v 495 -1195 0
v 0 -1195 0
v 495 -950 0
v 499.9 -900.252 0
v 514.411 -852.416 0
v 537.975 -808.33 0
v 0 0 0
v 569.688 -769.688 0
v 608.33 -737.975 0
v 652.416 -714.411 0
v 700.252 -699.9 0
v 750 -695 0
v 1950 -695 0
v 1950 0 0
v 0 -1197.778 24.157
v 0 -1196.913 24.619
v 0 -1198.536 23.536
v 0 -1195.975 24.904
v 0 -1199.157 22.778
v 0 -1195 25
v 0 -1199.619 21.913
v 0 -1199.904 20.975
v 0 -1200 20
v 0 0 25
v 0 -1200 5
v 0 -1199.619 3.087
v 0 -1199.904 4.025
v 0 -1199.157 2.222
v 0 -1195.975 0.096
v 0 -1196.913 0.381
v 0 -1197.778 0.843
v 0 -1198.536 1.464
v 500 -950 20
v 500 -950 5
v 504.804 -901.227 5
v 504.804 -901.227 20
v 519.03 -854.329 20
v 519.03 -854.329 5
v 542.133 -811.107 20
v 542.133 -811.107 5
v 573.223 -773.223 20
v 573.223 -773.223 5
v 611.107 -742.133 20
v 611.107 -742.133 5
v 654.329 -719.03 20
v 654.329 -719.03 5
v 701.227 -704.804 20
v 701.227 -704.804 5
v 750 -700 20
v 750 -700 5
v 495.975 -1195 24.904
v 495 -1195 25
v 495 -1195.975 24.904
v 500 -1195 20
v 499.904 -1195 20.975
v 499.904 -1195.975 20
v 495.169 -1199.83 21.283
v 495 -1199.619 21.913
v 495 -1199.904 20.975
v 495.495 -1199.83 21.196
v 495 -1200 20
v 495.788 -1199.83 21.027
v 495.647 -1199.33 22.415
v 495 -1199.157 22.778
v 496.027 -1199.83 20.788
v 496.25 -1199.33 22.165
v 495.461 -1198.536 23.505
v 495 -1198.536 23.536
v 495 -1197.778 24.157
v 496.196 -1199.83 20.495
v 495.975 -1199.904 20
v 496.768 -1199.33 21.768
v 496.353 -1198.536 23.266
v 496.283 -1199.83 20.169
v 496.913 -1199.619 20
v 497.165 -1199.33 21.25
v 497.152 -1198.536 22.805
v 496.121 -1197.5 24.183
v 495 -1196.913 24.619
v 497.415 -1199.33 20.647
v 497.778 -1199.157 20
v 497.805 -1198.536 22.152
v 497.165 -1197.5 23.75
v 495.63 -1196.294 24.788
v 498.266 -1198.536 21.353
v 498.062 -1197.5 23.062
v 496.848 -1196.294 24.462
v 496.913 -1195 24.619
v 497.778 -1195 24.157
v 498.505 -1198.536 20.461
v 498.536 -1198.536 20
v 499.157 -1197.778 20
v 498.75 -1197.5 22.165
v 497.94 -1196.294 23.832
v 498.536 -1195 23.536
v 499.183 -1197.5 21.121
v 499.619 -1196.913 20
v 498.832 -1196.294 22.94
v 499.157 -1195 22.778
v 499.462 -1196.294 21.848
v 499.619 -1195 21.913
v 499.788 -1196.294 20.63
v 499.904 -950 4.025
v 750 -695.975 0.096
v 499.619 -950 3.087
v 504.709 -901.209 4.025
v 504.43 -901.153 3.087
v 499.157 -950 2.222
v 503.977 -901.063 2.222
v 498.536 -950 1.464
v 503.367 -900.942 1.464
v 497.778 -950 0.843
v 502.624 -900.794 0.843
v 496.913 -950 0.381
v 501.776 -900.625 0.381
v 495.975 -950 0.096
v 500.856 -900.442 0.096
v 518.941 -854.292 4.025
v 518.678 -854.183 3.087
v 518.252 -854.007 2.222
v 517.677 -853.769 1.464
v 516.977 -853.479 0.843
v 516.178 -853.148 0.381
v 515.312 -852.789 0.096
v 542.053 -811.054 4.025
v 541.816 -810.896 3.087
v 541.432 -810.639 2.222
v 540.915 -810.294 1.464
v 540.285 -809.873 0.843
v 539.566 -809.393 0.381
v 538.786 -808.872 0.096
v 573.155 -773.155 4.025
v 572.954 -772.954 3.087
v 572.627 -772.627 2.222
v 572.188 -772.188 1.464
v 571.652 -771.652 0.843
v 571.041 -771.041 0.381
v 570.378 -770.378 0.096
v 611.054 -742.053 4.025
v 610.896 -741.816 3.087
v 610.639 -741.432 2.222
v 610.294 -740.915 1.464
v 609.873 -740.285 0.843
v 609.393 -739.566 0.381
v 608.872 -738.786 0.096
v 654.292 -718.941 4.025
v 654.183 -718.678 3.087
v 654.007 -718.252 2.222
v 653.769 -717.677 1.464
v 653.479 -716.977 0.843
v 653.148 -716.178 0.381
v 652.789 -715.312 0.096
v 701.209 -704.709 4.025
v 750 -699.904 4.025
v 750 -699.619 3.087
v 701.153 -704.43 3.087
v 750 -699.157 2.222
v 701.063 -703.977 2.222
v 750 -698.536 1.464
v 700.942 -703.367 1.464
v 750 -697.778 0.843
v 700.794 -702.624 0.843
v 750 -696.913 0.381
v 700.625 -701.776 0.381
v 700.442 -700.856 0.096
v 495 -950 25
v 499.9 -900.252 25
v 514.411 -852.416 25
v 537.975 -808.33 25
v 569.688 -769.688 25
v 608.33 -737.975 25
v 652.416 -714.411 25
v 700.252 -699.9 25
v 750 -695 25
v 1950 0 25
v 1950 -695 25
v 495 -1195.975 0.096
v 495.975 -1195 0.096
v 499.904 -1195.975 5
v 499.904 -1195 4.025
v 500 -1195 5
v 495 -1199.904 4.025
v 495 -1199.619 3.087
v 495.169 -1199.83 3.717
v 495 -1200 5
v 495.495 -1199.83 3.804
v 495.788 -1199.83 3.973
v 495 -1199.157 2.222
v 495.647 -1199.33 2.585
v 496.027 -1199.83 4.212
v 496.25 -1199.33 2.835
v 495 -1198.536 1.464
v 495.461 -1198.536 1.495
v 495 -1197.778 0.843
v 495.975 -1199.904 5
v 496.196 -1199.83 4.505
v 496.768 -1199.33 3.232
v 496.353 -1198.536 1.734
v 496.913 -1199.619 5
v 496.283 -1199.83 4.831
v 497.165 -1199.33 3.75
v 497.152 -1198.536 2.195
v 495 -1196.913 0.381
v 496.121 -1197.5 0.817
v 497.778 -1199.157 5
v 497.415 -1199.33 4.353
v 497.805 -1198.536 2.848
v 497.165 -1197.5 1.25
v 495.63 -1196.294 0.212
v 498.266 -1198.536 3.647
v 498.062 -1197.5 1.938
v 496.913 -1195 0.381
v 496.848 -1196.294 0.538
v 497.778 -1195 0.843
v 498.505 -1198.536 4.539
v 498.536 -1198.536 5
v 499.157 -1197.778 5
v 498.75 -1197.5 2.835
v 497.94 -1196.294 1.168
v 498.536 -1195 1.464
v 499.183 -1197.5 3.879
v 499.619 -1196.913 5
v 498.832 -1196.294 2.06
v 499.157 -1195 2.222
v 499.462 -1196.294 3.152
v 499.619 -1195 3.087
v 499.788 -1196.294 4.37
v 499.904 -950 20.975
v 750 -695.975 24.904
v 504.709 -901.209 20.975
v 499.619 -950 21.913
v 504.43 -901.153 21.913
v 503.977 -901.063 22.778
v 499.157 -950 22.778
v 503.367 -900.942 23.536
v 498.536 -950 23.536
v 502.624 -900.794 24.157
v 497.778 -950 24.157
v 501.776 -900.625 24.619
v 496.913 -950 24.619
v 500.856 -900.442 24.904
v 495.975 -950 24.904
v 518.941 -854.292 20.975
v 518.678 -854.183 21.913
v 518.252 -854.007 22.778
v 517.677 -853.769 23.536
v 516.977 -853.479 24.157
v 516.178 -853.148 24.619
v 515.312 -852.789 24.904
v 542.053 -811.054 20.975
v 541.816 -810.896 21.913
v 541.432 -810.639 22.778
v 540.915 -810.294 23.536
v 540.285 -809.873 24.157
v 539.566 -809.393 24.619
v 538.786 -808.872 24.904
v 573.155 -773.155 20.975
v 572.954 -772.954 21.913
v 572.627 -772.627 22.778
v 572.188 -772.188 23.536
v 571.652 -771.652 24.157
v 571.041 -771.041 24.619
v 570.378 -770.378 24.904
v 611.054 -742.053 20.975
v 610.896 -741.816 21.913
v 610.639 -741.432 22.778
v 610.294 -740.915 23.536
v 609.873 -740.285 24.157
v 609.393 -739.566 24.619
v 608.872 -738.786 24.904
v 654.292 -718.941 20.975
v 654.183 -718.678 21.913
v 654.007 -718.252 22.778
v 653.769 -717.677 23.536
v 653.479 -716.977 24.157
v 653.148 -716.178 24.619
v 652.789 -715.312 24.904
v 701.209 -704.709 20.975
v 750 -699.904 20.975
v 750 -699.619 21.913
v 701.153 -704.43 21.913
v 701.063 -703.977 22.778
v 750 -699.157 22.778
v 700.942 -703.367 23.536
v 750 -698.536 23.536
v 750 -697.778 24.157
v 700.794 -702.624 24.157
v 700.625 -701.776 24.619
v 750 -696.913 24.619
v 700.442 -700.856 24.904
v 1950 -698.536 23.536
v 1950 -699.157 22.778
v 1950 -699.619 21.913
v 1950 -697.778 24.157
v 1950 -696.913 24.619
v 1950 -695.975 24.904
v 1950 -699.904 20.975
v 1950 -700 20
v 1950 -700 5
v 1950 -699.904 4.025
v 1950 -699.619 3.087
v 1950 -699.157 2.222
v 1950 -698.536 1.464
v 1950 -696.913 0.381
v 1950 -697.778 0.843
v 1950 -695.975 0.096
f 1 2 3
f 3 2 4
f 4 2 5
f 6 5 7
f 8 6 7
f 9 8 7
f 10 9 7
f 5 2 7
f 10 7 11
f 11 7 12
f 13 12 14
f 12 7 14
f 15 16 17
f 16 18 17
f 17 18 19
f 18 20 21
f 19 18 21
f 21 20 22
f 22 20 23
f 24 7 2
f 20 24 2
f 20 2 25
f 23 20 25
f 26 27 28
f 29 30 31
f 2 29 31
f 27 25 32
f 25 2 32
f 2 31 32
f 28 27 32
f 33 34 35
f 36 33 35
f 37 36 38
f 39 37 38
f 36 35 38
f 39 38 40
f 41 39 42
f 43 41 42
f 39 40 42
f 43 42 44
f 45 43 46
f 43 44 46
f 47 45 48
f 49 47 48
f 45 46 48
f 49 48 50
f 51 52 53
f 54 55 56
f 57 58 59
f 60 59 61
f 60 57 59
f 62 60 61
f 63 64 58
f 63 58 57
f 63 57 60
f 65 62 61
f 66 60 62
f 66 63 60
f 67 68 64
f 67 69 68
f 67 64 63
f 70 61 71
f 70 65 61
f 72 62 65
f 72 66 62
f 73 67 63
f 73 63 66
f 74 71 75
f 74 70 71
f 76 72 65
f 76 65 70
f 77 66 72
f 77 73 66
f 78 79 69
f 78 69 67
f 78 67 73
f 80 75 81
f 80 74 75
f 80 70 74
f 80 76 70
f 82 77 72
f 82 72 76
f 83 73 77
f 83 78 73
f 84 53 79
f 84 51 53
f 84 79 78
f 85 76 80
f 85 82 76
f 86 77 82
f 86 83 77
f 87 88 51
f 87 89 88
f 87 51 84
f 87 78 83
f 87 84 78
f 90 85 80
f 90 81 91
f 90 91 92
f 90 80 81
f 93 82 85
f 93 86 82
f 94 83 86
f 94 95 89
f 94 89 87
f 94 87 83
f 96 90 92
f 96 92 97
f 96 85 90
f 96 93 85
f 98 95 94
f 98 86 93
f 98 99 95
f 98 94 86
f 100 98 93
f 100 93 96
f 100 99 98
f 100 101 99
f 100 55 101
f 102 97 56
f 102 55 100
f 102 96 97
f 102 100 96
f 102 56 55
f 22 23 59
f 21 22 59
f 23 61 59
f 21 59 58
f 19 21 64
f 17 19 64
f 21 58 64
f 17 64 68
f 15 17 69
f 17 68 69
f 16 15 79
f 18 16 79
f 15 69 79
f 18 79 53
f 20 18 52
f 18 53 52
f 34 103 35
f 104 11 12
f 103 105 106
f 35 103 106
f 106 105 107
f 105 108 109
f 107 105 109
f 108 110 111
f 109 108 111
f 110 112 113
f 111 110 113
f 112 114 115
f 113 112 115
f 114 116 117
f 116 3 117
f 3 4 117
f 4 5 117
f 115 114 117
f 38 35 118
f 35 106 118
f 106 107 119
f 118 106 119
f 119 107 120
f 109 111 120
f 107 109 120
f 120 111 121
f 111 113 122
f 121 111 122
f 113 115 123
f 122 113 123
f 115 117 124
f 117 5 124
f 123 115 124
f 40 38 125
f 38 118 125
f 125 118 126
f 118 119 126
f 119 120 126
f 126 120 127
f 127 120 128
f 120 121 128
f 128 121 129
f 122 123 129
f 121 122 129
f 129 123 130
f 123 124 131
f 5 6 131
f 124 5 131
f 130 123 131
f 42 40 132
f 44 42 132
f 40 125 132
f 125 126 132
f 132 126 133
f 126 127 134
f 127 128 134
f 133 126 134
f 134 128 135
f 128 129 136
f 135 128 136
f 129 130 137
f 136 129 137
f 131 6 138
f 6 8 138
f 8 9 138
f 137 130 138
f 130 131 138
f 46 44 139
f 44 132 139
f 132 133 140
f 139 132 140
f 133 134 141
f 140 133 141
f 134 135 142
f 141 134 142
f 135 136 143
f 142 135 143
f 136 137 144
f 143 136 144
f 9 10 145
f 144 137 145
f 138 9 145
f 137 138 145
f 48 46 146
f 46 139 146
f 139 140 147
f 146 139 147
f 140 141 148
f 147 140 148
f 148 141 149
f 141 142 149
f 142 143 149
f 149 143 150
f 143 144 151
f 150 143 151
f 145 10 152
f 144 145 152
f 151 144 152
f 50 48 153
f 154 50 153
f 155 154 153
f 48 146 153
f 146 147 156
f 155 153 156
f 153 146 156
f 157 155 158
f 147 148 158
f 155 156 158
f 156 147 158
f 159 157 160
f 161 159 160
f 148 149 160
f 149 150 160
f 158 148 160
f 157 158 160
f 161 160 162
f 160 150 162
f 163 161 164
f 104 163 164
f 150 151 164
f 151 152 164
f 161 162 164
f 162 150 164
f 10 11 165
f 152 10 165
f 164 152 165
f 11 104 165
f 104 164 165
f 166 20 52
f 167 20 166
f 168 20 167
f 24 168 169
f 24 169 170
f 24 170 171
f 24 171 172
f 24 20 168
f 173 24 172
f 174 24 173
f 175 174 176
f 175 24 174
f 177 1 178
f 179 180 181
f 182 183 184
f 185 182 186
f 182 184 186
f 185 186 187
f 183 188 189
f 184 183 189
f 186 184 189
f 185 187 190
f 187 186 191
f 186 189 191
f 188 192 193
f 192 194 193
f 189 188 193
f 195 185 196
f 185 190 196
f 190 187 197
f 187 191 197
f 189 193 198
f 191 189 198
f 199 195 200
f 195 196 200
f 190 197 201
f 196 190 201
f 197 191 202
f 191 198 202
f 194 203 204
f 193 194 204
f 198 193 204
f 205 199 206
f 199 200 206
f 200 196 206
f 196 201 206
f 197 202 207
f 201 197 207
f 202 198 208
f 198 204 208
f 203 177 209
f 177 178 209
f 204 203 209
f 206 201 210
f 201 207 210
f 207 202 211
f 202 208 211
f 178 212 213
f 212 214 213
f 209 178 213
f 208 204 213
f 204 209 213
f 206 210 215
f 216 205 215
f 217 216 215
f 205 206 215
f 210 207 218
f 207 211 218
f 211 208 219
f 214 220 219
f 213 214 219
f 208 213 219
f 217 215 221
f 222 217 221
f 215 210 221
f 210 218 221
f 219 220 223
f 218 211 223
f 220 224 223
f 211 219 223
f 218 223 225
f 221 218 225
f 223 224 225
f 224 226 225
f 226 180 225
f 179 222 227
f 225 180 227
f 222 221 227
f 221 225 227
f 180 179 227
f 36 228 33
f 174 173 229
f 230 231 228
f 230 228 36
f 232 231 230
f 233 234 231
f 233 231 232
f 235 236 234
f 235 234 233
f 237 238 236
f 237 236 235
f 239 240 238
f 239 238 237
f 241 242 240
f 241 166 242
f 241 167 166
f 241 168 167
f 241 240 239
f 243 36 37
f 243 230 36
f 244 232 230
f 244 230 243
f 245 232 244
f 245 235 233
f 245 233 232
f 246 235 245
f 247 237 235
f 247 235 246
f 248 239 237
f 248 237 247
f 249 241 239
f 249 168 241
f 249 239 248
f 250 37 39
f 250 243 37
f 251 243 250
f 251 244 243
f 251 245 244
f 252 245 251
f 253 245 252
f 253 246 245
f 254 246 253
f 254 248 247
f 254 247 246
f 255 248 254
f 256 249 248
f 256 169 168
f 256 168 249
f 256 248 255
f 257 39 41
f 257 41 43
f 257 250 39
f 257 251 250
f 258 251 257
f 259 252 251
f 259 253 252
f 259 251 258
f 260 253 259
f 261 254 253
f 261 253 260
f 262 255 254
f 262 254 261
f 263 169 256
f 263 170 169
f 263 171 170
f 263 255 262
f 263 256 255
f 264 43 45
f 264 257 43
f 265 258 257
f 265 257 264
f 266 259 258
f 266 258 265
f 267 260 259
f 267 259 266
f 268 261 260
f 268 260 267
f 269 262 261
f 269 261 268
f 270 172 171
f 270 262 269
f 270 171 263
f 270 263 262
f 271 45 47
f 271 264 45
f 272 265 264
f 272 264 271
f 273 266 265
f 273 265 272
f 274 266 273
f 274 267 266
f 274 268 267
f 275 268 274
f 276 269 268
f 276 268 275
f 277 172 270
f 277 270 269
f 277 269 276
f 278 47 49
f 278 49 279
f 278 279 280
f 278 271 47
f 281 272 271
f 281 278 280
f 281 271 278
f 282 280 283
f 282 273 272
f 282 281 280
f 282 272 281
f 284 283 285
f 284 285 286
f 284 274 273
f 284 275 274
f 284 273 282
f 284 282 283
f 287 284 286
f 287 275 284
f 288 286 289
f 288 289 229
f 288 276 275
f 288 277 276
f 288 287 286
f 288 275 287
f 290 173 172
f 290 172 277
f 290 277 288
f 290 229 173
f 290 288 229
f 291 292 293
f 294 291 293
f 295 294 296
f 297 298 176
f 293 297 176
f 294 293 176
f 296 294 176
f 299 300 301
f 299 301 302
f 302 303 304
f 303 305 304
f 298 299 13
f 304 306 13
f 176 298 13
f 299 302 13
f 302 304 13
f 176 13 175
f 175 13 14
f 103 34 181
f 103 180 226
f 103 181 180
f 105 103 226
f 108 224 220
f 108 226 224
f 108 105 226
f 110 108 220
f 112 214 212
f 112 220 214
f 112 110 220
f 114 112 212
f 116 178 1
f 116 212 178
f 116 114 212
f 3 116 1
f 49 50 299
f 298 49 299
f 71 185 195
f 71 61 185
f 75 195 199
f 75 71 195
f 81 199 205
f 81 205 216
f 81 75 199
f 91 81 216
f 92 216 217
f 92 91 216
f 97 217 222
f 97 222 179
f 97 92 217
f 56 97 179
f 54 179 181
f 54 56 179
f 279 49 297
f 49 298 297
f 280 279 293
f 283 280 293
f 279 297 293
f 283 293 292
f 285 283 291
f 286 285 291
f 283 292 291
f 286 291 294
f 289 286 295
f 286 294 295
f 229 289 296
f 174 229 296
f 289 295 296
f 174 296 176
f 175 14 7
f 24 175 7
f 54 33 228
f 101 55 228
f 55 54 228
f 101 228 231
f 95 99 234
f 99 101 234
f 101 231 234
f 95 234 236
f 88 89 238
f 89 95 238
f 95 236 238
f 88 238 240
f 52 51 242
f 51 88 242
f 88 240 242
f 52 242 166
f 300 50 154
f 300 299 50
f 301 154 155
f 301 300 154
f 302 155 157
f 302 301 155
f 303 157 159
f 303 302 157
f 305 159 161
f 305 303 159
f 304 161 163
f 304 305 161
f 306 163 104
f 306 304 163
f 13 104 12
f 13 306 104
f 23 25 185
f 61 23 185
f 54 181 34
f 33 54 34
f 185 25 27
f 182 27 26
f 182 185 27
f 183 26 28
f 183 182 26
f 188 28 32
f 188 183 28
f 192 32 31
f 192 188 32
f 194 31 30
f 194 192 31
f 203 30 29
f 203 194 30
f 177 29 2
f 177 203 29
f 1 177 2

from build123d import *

# Parameters (mm, degrees)
F1_DEPTH = 25
F2_R     = 5


with BuildPart() as f1:
    # F0 (on Top) → F1 (new body)
    with BuildSketch(Plane.XY):
        with BuildLine():
            Line((0, 0), (0, -1200))
            Line((0, -1200), (500, -1200))
            Line((500, -1200), (500, -950))
            ThreePointArc((500, -950), (573.223305, -773.223305), (750, -700))
            Line((750, -700), (1950, -700))
            Line((1950, -700), (1950, 0))
            Line((1950, 0), (0, 0))
        make_face()
    extrude(amount=F1_DEPTH)

    # F2
    f2_edges = [f1.edges().sort_by_distance(p)[0] for p in [
        (1350, -700, 25),
        (1350, -700, 0),
        (250, -1200, 25),
        (250, -1200, 0),
        (500, -1200, 12.5),
    ]]
    fillet(f2_edges, radius=F2_R)


solid = f1.part
